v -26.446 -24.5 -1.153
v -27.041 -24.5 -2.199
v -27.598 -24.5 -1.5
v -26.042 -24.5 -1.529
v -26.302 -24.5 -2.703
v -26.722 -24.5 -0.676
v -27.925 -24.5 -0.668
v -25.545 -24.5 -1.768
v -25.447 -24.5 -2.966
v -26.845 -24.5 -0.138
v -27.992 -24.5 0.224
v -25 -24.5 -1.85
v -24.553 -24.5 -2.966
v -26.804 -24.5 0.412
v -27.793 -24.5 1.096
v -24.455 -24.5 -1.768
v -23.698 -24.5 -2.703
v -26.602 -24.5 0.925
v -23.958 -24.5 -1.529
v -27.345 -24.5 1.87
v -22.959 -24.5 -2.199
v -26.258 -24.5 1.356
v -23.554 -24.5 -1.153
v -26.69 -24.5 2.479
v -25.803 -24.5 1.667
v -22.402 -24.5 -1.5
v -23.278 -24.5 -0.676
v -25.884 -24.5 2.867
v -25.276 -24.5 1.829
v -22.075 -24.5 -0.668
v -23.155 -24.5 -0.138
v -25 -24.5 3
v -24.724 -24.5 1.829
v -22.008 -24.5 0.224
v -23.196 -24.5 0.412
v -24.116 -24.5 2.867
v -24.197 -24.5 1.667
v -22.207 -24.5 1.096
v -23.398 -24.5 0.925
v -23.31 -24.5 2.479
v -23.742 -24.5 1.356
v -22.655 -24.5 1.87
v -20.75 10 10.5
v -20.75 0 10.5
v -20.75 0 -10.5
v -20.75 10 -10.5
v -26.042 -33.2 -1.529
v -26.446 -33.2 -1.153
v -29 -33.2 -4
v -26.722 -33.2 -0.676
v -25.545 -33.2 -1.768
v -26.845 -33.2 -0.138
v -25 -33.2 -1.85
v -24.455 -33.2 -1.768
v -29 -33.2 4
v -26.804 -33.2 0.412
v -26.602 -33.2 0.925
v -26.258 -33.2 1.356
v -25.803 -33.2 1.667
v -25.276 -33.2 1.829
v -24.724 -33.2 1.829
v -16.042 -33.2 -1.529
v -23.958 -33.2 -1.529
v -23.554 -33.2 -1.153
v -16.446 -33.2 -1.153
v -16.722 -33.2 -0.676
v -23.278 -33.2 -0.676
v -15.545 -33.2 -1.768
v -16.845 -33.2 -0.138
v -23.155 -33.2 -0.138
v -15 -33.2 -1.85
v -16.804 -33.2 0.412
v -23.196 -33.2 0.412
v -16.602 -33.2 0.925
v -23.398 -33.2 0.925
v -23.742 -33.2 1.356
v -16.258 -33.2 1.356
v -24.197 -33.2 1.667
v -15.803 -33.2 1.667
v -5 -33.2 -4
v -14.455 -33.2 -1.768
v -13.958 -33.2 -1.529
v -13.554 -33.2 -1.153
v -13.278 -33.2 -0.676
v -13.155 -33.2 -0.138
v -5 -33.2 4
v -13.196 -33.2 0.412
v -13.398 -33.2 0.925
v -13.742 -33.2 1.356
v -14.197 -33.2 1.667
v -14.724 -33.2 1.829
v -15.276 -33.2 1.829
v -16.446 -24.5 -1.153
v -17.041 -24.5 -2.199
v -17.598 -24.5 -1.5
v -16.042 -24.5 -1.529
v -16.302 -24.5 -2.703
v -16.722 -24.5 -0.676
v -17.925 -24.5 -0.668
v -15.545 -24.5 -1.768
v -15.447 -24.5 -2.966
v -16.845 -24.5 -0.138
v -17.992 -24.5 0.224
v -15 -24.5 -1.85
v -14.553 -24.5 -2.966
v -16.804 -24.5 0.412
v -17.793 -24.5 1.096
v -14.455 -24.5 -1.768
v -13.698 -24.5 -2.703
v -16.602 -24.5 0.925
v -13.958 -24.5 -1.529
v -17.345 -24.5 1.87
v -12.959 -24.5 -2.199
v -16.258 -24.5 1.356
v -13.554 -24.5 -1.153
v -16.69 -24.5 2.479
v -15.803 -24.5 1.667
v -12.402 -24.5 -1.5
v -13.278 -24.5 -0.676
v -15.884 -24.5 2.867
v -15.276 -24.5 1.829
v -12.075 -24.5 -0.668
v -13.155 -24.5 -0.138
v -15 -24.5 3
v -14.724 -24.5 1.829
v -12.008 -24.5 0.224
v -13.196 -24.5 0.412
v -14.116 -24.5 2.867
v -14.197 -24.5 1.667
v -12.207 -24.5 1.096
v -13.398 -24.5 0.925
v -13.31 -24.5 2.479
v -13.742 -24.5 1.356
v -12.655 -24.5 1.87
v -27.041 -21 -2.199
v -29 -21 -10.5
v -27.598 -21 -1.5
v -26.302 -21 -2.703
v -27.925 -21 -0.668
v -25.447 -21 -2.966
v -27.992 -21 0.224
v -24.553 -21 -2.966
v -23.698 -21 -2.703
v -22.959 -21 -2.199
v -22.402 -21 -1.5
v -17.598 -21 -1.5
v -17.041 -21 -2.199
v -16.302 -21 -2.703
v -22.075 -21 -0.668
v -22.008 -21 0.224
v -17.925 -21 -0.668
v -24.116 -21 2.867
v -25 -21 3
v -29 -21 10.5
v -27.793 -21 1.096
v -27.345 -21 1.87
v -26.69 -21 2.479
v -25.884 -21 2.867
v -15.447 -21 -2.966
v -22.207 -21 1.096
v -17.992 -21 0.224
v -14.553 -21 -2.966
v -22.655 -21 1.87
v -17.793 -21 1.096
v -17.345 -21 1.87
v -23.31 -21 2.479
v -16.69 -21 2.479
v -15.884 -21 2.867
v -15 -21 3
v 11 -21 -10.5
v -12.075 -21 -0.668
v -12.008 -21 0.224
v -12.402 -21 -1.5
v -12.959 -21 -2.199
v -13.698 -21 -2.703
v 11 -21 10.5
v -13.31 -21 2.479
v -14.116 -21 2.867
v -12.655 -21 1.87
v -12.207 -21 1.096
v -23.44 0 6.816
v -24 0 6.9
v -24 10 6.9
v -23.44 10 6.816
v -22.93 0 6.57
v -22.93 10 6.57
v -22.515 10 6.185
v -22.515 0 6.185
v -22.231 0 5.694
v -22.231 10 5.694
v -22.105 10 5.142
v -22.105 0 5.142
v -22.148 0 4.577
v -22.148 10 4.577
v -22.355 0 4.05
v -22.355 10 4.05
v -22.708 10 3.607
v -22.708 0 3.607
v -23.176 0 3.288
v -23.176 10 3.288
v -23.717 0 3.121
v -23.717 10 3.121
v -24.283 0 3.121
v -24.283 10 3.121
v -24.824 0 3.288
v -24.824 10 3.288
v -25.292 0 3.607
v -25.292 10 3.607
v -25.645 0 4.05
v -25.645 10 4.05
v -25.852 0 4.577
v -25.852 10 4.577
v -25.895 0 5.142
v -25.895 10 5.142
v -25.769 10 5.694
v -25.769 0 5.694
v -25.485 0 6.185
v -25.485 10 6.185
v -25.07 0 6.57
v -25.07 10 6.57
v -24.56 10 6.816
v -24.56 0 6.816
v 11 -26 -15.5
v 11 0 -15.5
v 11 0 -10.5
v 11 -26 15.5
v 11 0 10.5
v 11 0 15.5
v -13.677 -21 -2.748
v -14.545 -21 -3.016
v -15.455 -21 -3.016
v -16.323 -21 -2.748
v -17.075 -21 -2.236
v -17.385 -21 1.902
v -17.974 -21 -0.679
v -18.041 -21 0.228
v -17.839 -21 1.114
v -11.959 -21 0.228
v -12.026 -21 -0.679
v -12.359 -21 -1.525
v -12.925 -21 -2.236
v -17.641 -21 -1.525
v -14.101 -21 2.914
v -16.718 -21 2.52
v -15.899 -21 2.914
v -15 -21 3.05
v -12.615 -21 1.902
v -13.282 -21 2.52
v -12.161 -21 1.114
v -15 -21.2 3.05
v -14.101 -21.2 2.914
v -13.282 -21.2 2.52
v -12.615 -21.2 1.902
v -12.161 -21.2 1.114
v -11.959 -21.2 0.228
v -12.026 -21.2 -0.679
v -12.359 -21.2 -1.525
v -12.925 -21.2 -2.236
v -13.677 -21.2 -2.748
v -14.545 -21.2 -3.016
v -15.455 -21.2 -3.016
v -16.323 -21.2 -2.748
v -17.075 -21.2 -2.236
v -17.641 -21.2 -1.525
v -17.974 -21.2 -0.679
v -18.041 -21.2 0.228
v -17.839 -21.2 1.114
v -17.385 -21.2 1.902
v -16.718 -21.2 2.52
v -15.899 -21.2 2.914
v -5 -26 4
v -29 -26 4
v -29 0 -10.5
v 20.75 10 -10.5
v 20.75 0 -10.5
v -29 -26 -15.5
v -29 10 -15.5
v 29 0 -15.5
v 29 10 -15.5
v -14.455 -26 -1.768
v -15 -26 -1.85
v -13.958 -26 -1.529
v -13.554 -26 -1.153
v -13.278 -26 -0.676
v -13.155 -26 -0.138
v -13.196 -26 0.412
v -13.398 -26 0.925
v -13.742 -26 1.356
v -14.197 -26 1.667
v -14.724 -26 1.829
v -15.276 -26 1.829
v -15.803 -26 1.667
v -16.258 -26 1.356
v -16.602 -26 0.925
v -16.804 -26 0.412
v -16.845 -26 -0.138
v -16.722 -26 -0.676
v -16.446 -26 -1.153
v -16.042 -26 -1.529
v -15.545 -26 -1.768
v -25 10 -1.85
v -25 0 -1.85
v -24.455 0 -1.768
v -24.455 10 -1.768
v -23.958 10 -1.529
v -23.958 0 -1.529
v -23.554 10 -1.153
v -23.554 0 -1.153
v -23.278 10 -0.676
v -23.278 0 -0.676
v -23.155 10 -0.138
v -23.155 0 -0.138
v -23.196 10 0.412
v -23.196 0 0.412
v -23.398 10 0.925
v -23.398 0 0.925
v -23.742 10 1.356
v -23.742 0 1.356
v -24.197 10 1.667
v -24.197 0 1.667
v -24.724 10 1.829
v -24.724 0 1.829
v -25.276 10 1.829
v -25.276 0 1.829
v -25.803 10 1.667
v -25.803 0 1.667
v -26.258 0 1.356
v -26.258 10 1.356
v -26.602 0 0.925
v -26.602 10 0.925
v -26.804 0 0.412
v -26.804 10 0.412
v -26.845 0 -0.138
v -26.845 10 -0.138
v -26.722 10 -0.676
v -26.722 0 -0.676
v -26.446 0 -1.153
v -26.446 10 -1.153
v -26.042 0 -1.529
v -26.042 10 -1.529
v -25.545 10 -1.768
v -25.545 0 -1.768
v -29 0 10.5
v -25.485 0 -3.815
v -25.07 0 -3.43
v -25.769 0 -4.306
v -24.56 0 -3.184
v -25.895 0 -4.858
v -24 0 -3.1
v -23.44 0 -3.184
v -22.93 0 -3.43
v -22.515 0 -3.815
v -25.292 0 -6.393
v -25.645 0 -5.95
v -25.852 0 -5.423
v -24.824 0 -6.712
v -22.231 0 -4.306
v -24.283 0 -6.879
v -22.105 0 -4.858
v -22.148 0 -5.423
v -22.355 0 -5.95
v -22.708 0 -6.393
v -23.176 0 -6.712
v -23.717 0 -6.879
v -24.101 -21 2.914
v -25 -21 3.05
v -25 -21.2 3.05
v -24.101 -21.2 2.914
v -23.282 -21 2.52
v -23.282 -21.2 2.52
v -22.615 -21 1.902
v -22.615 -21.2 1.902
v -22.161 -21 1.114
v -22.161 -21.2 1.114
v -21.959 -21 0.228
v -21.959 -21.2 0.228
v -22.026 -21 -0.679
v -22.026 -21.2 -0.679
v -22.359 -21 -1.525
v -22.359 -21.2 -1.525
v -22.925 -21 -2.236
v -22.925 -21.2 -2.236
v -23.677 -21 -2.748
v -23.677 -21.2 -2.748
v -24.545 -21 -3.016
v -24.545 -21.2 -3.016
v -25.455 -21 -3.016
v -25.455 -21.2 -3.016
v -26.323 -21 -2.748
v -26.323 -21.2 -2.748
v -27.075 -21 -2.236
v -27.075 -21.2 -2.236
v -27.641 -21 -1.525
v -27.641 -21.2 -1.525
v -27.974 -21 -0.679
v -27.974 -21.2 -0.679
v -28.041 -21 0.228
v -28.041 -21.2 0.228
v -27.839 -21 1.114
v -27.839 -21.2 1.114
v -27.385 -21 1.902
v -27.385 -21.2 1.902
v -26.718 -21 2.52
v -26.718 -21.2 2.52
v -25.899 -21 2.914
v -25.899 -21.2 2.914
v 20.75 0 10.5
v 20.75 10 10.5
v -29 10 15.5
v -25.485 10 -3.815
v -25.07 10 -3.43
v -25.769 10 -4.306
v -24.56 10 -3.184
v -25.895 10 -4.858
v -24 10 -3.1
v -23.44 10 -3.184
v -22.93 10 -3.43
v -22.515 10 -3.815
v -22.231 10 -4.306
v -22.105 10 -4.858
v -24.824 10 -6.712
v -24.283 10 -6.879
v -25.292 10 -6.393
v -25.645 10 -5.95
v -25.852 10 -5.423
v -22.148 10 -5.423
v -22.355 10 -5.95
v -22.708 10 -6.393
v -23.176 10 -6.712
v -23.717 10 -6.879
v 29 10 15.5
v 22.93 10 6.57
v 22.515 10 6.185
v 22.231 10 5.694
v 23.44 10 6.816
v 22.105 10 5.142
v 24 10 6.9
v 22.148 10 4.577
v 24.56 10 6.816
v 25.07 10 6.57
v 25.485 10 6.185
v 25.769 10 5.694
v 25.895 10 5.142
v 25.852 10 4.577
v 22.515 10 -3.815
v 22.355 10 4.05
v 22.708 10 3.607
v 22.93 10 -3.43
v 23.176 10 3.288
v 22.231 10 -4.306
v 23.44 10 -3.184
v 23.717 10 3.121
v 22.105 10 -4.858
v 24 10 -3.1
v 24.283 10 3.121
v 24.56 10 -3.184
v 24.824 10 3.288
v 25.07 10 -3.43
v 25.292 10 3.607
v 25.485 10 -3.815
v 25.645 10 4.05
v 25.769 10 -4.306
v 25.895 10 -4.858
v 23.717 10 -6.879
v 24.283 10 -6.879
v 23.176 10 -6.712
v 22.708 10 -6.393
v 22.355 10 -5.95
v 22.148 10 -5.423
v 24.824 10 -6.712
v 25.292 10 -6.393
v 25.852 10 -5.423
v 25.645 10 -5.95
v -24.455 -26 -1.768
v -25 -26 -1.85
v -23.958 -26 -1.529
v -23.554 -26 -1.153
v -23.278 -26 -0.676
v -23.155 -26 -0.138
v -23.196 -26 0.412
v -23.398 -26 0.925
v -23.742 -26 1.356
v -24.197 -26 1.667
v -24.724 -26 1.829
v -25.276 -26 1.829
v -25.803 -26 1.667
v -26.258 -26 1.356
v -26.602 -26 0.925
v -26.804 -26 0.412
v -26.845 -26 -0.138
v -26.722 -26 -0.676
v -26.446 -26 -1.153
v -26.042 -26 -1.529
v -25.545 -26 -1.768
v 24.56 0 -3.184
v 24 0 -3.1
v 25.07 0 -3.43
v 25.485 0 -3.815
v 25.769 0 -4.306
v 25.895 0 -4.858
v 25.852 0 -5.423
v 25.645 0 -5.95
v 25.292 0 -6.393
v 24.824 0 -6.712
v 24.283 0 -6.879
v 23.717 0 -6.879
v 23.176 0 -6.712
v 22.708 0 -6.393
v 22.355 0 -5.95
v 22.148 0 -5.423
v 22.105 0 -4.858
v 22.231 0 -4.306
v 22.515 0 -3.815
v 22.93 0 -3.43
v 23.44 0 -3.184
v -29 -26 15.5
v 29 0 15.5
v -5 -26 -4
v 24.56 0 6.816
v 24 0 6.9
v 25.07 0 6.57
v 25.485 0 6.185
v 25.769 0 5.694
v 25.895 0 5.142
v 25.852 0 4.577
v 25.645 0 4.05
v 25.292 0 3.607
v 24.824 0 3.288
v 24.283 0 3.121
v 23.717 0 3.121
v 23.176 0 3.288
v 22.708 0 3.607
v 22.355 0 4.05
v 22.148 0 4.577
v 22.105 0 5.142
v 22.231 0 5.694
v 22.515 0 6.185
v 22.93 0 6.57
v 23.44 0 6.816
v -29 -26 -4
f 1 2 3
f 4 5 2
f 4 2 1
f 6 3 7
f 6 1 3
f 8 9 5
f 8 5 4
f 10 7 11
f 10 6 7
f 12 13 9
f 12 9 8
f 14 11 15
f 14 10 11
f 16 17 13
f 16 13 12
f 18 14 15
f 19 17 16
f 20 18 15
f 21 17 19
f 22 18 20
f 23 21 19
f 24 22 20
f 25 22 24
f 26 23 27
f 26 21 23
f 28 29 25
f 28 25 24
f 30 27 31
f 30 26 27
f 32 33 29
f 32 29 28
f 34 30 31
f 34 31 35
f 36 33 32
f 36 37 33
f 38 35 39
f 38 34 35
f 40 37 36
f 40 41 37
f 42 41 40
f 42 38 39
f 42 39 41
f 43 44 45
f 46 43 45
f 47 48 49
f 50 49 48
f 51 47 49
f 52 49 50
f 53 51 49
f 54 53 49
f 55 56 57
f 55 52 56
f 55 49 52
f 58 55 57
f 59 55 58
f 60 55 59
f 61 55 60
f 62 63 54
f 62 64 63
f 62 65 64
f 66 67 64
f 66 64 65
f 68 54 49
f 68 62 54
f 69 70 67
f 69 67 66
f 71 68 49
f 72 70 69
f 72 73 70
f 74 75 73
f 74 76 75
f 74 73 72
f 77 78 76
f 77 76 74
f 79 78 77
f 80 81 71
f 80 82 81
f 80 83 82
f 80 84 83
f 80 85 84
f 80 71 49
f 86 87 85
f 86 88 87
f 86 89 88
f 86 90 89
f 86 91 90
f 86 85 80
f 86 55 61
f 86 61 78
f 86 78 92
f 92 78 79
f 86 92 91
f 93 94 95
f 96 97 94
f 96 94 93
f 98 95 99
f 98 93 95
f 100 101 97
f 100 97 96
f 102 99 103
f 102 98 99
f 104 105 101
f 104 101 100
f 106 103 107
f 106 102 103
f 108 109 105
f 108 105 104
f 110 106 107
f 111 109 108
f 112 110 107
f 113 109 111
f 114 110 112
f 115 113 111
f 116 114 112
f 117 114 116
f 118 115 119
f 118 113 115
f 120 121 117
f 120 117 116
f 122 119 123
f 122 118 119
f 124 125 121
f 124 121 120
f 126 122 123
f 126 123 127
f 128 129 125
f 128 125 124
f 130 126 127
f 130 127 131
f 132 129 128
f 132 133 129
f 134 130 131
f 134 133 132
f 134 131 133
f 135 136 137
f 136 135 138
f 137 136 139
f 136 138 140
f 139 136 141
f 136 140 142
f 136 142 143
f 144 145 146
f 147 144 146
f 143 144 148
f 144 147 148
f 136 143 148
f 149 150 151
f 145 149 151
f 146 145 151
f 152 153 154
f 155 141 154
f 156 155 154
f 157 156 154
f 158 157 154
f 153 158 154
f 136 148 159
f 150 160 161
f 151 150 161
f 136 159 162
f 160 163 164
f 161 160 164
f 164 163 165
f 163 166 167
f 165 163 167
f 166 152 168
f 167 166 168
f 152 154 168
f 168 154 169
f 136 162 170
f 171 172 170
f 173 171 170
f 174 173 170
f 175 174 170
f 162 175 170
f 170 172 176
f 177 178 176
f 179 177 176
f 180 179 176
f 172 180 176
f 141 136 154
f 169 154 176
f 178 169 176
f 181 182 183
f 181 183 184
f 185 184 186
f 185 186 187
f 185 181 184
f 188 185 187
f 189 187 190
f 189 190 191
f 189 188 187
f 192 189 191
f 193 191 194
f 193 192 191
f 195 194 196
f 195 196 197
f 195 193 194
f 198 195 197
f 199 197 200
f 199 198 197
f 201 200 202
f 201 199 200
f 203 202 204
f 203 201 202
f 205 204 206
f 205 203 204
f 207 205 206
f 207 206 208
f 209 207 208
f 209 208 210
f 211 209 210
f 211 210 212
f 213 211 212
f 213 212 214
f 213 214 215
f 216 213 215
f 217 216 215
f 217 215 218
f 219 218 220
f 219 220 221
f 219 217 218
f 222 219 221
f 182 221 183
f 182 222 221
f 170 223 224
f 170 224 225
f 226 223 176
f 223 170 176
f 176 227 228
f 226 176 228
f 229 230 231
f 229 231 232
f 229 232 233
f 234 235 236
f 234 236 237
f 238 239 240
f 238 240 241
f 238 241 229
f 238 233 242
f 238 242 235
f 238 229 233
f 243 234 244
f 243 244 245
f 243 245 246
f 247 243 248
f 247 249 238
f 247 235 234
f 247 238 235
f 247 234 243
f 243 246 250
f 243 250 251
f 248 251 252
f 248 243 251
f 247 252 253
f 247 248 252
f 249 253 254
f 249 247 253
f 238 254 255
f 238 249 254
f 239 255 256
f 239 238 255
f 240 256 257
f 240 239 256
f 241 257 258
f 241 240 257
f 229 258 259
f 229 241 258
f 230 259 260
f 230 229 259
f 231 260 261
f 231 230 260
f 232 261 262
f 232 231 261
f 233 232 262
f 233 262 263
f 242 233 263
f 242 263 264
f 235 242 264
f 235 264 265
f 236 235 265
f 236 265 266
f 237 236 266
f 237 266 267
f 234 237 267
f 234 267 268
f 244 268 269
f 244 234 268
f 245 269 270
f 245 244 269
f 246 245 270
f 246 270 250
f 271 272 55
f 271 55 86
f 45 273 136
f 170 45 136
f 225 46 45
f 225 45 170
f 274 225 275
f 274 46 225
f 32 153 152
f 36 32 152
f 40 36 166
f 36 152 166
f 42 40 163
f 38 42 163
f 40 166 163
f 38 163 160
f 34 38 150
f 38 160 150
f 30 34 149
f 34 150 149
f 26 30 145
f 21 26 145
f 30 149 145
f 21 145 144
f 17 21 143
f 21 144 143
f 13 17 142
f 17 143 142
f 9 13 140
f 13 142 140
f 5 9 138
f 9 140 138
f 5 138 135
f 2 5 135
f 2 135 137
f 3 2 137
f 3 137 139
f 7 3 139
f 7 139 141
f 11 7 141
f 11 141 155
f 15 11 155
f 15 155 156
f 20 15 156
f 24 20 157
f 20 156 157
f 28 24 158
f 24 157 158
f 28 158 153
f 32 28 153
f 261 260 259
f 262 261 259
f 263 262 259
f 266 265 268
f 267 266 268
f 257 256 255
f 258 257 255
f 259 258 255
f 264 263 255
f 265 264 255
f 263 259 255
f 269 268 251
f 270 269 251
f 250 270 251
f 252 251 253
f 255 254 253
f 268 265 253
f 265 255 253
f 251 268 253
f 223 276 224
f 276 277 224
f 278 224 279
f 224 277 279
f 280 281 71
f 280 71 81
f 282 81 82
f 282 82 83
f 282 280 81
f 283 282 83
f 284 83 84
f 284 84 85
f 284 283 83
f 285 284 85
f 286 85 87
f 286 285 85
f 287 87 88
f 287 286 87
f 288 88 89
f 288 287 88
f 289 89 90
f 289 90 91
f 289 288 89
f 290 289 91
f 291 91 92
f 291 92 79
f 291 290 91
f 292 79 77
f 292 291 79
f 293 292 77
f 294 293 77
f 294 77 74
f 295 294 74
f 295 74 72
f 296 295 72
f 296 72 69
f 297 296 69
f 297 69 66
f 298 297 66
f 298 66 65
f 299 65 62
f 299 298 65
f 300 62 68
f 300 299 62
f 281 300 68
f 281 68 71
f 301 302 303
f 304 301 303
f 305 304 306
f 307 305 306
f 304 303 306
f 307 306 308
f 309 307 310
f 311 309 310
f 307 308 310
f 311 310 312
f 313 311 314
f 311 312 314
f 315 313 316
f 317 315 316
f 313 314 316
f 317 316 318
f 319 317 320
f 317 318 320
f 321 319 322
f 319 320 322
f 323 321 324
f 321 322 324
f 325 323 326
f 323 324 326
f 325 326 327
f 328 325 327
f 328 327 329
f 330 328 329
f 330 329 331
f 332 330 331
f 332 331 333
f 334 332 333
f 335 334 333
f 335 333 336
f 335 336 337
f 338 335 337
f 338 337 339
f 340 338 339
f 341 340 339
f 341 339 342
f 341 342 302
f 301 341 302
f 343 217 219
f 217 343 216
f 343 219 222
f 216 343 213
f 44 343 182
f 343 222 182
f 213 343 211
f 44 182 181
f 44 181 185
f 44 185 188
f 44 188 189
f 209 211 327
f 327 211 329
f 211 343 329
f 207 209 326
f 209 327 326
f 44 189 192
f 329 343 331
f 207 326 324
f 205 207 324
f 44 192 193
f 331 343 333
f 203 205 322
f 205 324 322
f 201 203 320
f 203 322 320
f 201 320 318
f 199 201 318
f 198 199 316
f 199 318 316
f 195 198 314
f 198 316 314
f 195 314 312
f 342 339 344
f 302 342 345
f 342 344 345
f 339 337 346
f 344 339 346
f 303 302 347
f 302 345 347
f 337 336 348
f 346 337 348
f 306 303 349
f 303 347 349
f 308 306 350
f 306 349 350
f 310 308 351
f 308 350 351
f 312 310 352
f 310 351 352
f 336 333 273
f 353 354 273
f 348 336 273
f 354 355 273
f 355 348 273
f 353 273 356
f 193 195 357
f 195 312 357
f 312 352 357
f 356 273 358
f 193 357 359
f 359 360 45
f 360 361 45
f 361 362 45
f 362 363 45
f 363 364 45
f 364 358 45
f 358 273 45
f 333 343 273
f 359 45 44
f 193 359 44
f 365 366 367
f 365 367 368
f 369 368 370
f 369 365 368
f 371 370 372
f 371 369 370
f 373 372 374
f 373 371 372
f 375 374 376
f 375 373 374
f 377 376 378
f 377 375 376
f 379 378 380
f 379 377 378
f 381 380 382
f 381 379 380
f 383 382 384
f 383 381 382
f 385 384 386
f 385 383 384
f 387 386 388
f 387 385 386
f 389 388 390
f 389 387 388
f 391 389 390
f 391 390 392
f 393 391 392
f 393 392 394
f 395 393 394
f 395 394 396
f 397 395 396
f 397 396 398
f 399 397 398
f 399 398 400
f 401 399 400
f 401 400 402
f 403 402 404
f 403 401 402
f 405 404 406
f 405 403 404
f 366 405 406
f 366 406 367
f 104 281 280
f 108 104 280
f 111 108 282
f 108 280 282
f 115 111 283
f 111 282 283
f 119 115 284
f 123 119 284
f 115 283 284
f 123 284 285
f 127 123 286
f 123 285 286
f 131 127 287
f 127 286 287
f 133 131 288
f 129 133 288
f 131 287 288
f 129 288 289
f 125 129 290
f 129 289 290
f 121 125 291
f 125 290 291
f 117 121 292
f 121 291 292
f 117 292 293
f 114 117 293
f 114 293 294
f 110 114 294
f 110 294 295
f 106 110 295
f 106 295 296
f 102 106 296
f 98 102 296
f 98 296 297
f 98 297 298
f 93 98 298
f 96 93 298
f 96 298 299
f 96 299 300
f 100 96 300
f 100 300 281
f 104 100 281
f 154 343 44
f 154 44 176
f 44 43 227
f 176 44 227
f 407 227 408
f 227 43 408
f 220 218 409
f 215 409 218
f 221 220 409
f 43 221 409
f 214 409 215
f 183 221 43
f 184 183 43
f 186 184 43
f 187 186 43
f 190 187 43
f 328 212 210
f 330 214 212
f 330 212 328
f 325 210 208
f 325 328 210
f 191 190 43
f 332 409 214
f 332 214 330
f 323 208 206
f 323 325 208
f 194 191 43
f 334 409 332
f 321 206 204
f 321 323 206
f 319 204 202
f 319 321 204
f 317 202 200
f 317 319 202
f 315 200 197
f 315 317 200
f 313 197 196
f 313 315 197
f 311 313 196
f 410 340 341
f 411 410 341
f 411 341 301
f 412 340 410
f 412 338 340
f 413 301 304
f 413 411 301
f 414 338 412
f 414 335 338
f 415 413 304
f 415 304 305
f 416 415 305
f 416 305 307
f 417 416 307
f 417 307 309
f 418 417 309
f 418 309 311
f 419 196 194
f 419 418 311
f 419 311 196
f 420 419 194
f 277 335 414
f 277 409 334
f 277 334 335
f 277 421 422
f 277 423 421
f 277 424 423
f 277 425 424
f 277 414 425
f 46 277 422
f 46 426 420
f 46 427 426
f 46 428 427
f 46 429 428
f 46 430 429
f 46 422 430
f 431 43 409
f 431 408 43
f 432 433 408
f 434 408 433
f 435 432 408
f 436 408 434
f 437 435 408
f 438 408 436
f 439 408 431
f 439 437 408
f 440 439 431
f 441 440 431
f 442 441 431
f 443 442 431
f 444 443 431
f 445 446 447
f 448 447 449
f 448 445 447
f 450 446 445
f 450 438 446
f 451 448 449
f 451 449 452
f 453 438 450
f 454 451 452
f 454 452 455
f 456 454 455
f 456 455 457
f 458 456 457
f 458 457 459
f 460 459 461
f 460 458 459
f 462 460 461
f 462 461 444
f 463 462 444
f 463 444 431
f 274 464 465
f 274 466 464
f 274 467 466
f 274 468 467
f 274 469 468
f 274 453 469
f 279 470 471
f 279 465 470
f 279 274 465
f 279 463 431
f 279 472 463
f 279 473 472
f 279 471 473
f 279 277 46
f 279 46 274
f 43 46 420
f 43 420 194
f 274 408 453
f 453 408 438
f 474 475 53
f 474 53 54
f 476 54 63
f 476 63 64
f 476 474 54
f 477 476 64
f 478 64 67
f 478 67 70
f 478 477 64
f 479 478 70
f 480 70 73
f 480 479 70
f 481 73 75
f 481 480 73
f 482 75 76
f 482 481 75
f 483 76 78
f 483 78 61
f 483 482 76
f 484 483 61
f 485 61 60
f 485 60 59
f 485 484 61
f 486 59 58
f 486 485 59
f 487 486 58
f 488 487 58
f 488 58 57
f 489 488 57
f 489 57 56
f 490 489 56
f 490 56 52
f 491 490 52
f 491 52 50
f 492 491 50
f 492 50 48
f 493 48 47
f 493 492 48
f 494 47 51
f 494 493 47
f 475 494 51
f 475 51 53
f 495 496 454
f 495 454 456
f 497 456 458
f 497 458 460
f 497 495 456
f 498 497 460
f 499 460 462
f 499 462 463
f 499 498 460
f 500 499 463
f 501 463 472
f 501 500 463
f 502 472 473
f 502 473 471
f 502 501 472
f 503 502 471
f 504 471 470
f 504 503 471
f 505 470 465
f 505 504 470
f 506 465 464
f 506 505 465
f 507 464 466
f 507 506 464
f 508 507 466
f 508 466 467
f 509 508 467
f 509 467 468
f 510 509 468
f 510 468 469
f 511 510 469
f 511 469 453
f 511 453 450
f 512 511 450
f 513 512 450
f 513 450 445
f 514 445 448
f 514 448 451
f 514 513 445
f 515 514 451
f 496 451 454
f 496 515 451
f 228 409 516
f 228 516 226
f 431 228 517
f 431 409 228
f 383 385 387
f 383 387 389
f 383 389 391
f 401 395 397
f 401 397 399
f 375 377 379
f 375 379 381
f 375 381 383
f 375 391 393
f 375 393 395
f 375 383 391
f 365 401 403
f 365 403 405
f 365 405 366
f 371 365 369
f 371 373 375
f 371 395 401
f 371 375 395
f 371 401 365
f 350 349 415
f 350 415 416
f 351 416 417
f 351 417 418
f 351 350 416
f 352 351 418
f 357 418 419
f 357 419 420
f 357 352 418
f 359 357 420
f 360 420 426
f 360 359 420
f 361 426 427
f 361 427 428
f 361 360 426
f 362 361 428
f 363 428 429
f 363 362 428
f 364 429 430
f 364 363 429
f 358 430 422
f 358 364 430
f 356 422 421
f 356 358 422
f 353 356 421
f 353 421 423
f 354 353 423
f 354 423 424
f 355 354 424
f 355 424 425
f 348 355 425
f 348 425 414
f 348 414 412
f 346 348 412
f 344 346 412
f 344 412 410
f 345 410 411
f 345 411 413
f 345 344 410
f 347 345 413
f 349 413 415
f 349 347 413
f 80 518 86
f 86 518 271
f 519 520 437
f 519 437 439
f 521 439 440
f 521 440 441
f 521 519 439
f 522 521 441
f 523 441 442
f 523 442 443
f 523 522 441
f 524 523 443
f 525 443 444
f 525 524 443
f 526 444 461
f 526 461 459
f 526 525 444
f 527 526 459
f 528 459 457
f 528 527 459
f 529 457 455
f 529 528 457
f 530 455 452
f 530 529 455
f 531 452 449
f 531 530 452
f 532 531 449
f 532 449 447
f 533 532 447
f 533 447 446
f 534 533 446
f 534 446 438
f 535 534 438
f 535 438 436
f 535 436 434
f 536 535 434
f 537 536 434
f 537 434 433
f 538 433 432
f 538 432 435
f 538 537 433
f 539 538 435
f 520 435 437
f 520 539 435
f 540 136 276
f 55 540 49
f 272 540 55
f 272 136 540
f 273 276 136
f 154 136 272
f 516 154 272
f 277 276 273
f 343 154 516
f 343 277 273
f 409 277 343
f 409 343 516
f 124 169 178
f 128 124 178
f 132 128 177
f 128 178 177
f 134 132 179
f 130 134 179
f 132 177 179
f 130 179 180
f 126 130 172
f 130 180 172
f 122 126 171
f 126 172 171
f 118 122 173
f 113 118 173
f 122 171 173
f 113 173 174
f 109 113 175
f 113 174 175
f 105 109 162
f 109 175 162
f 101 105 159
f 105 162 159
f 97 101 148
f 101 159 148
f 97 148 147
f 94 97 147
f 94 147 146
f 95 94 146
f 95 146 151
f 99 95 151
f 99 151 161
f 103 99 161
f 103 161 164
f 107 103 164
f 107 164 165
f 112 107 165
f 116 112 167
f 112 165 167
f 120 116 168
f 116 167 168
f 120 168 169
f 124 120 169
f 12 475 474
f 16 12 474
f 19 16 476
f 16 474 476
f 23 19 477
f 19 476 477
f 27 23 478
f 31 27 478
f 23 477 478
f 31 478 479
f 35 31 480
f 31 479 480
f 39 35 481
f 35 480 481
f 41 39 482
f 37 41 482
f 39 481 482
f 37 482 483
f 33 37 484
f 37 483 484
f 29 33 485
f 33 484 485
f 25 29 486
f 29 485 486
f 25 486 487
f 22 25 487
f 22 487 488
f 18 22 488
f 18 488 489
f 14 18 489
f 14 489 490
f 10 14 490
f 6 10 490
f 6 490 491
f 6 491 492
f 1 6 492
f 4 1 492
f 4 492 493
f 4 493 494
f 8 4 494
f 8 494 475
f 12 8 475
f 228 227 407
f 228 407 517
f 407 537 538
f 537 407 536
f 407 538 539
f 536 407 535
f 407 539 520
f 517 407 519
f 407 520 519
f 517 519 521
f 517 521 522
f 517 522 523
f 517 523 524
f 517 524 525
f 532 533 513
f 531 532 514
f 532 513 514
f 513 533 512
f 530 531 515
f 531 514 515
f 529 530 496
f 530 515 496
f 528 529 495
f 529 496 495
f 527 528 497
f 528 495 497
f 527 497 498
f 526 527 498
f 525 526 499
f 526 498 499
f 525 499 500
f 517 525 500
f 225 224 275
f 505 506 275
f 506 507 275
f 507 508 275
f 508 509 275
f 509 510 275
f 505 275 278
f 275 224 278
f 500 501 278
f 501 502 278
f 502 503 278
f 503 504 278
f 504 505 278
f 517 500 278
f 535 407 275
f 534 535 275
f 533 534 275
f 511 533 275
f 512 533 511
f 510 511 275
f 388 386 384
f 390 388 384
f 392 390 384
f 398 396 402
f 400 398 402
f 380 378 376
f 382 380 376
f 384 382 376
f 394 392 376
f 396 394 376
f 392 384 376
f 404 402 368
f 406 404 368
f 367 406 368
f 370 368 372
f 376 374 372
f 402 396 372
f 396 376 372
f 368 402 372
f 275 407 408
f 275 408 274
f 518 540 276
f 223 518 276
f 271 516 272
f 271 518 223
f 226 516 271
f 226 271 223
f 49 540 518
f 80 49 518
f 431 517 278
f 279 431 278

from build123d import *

# Parameters (mm, degrees)
CROQUIS1_W                = 58
CROQUIS1_H                = 31
CROQUIS1_R                = 1.9
CROQUIS1_W_2              = 41.5
CROQUIS1_H_2              = 21
SALIENTE_EXTRUIR1_DEPTH   = 10
CROQUIS2_W                = 40
CROQUIS2_H                = 5
SALIENTE_EXTRUIR2_DEPTH   = 21
CROQUIS3_W                = 40
CROQUIS3_H                = 31
SALIENTE_EXTRUIR3_DEPTH   = 5
CROQUIS4_W                = 24
CROQUIS4_H                = 8
CROQUIS4_R                = 1.85
SALIENTE_EXTRUIR4_DEPTH   = 7.2
CROQUIS5_R                = 1.85
CORTAR_EXTRUIR1_DEPTH     = 55.290791116
CROQUIS6_R                = 3
CORTAR_EXTRUIR2_DEPTH     = 3.5
CROQUIS7_R                = 3.05
SALIENTE_EXTRUIR5_DEPTH   = 0.2
SALIENTE_EXTRUIR5_2_DEPTH = 0.2


with BuildPart() as part:
    # Croquis1 → Saliente-Extruir1 (new body)
    with BuildSketch(Plane(origin=(0, 0, 0), x_dir=(1, 0, 0), z_dir=(0, 1, 0))):
        Rectangle(CROQUIS1_W, CROQUIS1_H)
        with Locations(Location((-24, -5, 0), (0, 0, 270))):
            Circle(CROQUIS1_R, mode=Mode.SUBTRACT)
        with Locations(Location((24, -5, 0), (0, 0, 270))):
            Circle(CROQUIS1_R, mode=Mode.SUBTRACT)
        with Locations(Location((24, 5, 0), (0, 0, 270))):
            Circle(CROQUIS1_R, mode=Mode.SUBTRACT)
        with Locations(Location((-24, 5, 0), (0, 0, 270))):
            Circle(CROQUIS1_R, mode=Mode.SUBTRACT)
        Rectangle(CROQUIS1_W_2, CROQUIS1_H_2, mode=Mode.SUBTRACT)
    extrude(amount=SALIENTE_EXTRUIR1_DEPTH)

    # Croquis2 → Saliente-Extruir2 (add)
    with BuildSketch(Plane.XZ):
        with Locations((-9, 13)):
            Rectangle(CROQUIS2_W, CROQUIS2_H)
        with Locations((-9, -13)):
            Rectangle(CROQUIS2_W, CROQUIS2_H)
    extrude(amount=SALIENTE_EXTRUIR2_DEPTH)

    # Croquis3 → Saliente-Extruir3 (add)
    with BuildSketch(Plane.XZ.offset(21)):
        with Locations((-9, 0)):
            Rectangle(CROQUIS3_W, CROQUIS3_H)
    extrude(amount=SALIENTE_EXTRUIR3_DEPTH)

    # Croquis4 → Saliente-Extruir4 (add)
    with BuildSketch(Plane.XZ.offset(26)):
        with Locations((-17, 0)):
            Rectangle(CROQUIS4_W, CROQUIS4_H)
        with Locations(Location((-25, 0, 0), (0, 0, 270))):
            Circle(CROQUIS4_R, mode=Mode.SUBTRACT)
        with Locations(Location((-15, 0, 0), (0, 0, 270))):
            Circle(CROQUIS4_R, mode=Mode.SUBTRACT)
    extrude(amount=SALIENTE_EXTRUIR4_DEPTH)

    # Croquis5 → Cortar-Extruir1 (cut, through all)
    with BuildSketch(Plane.XZ.offset(33.2)):
        with Locations(Location((-25, 0, 0), (0, 0, 270))):
            Circle(CROQUIS5_R)
        with Locations(Location((-15, 0, 0), (0, 0, 270))):
            Circle(CROQUIS5_R)
    extrude(amount=-CORTAR_EXTRUIR1_DEPTH, mode=Mode.SUBTRACT)

    # Croquis6 → Cortar-Extruir2 (cut)
    with BuildSketch(Plane(origin=(0, -21, 0), x_dir=(1, 0, 0), z_dir=(0, 1, 0))):
        with Locations(Location((-25, 0, 0), (0, 0, 270))):
            Circle(CROQUIS6_R)
        with Locations(Location((-15, 0, 0), (0, 0, 270))):
            Circle(CROQUIS6_R)
    extrude(amount=-CORTAR_EXTRUIR2_DEPTH, mode=Mode.SUBTRACT)


with BuildPart() as body_2:
    # Croquis7 → Saliente-Extruir5 (new body)
    with BuildSketch(Plane(origin=(0, -21, 0), x_dir=(1, 0, 0), z_dir=(0, 1, 0))):
        with Locations(Location((-25, 0, 0), (0, 0, 270))):
            Circle(CROQUIS7_R)
    extrude(amount=-SALIENTE_EXTRUIR5_DEPTH)


with BuildPart() as body_3:
    # Croquis7 → Saliente-Extruir5 2 (new body)
    with BuildSketch(Plane(origin=(0, -21, 0), x_dir=(1, 0, 0), z_dir=(0, 1, 0))):
        with Locations(Location((-15, 0, 0), (0, 0, 270))):
            Circle(CROQUIS7_R)
    extrude(amount=-SALIENTE_EXTRUIR5_2_DEPTH)


solid = Compound([part.part, body_2.part, body_3.part])
